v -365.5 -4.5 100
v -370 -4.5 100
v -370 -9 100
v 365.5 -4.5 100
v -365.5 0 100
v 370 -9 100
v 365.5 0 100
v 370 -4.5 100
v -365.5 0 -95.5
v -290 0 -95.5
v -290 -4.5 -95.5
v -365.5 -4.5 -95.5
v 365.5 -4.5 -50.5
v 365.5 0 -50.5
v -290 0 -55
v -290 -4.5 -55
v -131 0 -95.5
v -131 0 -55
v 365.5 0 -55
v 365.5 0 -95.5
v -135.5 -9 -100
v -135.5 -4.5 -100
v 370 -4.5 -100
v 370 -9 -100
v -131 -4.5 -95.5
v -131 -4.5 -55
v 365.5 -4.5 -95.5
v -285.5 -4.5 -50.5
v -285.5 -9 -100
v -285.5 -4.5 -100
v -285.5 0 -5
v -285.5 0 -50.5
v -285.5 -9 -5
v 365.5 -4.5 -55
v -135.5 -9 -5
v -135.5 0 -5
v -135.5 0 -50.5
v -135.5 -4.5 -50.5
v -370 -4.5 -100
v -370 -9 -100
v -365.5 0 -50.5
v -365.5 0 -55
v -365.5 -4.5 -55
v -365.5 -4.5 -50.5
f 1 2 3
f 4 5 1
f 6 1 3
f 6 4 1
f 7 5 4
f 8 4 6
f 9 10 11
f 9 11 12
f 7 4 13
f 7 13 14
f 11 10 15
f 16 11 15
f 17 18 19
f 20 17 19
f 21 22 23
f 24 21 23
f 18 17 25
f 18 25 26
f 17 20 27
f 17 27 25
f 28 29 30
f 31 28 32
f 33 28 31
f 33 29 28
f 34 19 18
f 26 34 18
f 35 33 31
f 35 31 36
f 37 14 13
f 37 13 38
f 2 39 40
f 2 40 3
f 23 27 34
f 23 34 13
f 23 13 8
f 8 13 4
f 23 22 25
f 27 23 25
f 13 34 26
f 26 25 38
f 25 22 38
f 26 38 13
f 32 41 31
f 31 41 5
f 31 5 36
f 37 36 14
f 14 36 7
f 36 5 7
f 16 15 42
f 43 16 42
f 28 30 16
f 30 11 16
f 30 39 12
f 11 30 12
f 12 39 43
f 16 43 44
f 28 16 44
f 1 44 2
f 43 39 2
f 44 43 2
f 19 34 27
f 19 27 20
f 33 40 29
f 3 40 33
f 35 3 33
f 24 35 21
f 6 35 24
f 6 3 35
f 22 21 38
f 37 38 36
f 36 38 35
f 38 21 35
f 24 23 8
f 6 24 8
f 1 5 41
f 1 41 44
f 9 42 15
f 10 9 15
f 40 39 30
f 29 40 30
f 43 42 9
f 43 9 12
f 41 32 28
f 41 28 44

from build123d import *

# Parameters (mm, degrees)
F0_W      = 740
F0_H      = 200
F1_DEPTH  = 9
F2_W      = 4.5
F2_H      = 200
F3_DEPTH  = 4.5
F4_W      = 4.5
F4_H      = 200
F5_DEPTH  = 4.5
F6_W      = 731
F6_H      = 4.5
F7_DEPTH  = 4.5
F8_W      = 731
F8_H      = 4.5
F9_DEPTH  = 4.5
F10_W     = 150
F10_H     = 95
F11_DEPTH = 25
F12_W     = 4.5
F12_H     = 40.5
F13_DEPTH = 4.5
F14_W     = 4.5
F14_H     = 40.5
F15_DEPTH = 4.5


with BuildPart() as f1:
    # F0 (on Front) → F1 (new body)
    with BuildSketch(Plane.XZ):
        Rectangle(F0_W, F0_H)
    extrude(amount=F1_DEPTH)

    # F2 (on face) → F3 (cut)
    with BuildSketch(Plane.YZ.offset(370)):
        with Locations((-2.25, 0)):
            Rectangle(F2_W, F2_H)
    extrude(amount=-F3_DEPTH, mode=Mode.SUBTRACT)

    # F4 (on face) → F5 (cut)
    with BuildSketch(Plane(origin=(-370, 0, 0), x_dir=(0, -1, 0), z_dir=(-1, 0, 0))):
        with Locations((2.25, 0)):
            Rectangle(F4_W, F4_H)
    extrude(amount=-F5_DEPTH, mode=Mode.SUBTRACT)

    # F6 (on face) → F7 (cut)
    with BuildSketch(Plane(origin=(0, 0, 0), x_dir=(-1, 0, 0), z_dir=(0, 1, 0))):
        with Locations((0, -52.75)):
            Rectangle(F6_W, F6_H)
    extrude(amount=-F7_DEPTH, mode=Mode.SUBTRACT)

    # F8 (on face) → F9 (cut)
    with BuildSketch(Plane(origin=(0, 0, 0), x_dir=(-1, 0, 0), z_dir=(0, 1, 0))):
        with Locations((0, -97.75)):
            Rectangle(F8_W, F8_H)
    extrude(amount=-F9_DEPTH, mode=Mode.SUBTRACT)

    # F10 (on face) → F11 (cut)
    with BuildSketch(Plane.XZ.offset(9)):
        with Locations((-210.5, -52.5)):
            Rectangle(F10_W, F10_H)
    extrude(amount=-F11_DEPTH, mode=Mode.SUBTRACT)

    # F12 (on face) → F13 (cut)
    with BuildSketch(Plane(origin=(0, 0, 0), x_dir=(-1, 0, 0), z_dir=(0, 1, 0))):
        with Locations((133.25, -75.25)):
            Rectangle(F12_W, F12_H)
    extrude(amount=-F13_DEPTH, mode=Mode.SUBTRACT)

    # F14 (on face) → F15 (cut)
    with BuildSketch(Plane(origin=(0, 0, 0), x_dir=(-1, 0, 0), z_dir=(0, 1, 0))):
        with Locations((287.75, -75.25)):
            Rectangle(F14_W, F14_H)
    extrude(amount=-F15_DEPTH, mode=Mode.SUBTRACT)


solid = f1.part
